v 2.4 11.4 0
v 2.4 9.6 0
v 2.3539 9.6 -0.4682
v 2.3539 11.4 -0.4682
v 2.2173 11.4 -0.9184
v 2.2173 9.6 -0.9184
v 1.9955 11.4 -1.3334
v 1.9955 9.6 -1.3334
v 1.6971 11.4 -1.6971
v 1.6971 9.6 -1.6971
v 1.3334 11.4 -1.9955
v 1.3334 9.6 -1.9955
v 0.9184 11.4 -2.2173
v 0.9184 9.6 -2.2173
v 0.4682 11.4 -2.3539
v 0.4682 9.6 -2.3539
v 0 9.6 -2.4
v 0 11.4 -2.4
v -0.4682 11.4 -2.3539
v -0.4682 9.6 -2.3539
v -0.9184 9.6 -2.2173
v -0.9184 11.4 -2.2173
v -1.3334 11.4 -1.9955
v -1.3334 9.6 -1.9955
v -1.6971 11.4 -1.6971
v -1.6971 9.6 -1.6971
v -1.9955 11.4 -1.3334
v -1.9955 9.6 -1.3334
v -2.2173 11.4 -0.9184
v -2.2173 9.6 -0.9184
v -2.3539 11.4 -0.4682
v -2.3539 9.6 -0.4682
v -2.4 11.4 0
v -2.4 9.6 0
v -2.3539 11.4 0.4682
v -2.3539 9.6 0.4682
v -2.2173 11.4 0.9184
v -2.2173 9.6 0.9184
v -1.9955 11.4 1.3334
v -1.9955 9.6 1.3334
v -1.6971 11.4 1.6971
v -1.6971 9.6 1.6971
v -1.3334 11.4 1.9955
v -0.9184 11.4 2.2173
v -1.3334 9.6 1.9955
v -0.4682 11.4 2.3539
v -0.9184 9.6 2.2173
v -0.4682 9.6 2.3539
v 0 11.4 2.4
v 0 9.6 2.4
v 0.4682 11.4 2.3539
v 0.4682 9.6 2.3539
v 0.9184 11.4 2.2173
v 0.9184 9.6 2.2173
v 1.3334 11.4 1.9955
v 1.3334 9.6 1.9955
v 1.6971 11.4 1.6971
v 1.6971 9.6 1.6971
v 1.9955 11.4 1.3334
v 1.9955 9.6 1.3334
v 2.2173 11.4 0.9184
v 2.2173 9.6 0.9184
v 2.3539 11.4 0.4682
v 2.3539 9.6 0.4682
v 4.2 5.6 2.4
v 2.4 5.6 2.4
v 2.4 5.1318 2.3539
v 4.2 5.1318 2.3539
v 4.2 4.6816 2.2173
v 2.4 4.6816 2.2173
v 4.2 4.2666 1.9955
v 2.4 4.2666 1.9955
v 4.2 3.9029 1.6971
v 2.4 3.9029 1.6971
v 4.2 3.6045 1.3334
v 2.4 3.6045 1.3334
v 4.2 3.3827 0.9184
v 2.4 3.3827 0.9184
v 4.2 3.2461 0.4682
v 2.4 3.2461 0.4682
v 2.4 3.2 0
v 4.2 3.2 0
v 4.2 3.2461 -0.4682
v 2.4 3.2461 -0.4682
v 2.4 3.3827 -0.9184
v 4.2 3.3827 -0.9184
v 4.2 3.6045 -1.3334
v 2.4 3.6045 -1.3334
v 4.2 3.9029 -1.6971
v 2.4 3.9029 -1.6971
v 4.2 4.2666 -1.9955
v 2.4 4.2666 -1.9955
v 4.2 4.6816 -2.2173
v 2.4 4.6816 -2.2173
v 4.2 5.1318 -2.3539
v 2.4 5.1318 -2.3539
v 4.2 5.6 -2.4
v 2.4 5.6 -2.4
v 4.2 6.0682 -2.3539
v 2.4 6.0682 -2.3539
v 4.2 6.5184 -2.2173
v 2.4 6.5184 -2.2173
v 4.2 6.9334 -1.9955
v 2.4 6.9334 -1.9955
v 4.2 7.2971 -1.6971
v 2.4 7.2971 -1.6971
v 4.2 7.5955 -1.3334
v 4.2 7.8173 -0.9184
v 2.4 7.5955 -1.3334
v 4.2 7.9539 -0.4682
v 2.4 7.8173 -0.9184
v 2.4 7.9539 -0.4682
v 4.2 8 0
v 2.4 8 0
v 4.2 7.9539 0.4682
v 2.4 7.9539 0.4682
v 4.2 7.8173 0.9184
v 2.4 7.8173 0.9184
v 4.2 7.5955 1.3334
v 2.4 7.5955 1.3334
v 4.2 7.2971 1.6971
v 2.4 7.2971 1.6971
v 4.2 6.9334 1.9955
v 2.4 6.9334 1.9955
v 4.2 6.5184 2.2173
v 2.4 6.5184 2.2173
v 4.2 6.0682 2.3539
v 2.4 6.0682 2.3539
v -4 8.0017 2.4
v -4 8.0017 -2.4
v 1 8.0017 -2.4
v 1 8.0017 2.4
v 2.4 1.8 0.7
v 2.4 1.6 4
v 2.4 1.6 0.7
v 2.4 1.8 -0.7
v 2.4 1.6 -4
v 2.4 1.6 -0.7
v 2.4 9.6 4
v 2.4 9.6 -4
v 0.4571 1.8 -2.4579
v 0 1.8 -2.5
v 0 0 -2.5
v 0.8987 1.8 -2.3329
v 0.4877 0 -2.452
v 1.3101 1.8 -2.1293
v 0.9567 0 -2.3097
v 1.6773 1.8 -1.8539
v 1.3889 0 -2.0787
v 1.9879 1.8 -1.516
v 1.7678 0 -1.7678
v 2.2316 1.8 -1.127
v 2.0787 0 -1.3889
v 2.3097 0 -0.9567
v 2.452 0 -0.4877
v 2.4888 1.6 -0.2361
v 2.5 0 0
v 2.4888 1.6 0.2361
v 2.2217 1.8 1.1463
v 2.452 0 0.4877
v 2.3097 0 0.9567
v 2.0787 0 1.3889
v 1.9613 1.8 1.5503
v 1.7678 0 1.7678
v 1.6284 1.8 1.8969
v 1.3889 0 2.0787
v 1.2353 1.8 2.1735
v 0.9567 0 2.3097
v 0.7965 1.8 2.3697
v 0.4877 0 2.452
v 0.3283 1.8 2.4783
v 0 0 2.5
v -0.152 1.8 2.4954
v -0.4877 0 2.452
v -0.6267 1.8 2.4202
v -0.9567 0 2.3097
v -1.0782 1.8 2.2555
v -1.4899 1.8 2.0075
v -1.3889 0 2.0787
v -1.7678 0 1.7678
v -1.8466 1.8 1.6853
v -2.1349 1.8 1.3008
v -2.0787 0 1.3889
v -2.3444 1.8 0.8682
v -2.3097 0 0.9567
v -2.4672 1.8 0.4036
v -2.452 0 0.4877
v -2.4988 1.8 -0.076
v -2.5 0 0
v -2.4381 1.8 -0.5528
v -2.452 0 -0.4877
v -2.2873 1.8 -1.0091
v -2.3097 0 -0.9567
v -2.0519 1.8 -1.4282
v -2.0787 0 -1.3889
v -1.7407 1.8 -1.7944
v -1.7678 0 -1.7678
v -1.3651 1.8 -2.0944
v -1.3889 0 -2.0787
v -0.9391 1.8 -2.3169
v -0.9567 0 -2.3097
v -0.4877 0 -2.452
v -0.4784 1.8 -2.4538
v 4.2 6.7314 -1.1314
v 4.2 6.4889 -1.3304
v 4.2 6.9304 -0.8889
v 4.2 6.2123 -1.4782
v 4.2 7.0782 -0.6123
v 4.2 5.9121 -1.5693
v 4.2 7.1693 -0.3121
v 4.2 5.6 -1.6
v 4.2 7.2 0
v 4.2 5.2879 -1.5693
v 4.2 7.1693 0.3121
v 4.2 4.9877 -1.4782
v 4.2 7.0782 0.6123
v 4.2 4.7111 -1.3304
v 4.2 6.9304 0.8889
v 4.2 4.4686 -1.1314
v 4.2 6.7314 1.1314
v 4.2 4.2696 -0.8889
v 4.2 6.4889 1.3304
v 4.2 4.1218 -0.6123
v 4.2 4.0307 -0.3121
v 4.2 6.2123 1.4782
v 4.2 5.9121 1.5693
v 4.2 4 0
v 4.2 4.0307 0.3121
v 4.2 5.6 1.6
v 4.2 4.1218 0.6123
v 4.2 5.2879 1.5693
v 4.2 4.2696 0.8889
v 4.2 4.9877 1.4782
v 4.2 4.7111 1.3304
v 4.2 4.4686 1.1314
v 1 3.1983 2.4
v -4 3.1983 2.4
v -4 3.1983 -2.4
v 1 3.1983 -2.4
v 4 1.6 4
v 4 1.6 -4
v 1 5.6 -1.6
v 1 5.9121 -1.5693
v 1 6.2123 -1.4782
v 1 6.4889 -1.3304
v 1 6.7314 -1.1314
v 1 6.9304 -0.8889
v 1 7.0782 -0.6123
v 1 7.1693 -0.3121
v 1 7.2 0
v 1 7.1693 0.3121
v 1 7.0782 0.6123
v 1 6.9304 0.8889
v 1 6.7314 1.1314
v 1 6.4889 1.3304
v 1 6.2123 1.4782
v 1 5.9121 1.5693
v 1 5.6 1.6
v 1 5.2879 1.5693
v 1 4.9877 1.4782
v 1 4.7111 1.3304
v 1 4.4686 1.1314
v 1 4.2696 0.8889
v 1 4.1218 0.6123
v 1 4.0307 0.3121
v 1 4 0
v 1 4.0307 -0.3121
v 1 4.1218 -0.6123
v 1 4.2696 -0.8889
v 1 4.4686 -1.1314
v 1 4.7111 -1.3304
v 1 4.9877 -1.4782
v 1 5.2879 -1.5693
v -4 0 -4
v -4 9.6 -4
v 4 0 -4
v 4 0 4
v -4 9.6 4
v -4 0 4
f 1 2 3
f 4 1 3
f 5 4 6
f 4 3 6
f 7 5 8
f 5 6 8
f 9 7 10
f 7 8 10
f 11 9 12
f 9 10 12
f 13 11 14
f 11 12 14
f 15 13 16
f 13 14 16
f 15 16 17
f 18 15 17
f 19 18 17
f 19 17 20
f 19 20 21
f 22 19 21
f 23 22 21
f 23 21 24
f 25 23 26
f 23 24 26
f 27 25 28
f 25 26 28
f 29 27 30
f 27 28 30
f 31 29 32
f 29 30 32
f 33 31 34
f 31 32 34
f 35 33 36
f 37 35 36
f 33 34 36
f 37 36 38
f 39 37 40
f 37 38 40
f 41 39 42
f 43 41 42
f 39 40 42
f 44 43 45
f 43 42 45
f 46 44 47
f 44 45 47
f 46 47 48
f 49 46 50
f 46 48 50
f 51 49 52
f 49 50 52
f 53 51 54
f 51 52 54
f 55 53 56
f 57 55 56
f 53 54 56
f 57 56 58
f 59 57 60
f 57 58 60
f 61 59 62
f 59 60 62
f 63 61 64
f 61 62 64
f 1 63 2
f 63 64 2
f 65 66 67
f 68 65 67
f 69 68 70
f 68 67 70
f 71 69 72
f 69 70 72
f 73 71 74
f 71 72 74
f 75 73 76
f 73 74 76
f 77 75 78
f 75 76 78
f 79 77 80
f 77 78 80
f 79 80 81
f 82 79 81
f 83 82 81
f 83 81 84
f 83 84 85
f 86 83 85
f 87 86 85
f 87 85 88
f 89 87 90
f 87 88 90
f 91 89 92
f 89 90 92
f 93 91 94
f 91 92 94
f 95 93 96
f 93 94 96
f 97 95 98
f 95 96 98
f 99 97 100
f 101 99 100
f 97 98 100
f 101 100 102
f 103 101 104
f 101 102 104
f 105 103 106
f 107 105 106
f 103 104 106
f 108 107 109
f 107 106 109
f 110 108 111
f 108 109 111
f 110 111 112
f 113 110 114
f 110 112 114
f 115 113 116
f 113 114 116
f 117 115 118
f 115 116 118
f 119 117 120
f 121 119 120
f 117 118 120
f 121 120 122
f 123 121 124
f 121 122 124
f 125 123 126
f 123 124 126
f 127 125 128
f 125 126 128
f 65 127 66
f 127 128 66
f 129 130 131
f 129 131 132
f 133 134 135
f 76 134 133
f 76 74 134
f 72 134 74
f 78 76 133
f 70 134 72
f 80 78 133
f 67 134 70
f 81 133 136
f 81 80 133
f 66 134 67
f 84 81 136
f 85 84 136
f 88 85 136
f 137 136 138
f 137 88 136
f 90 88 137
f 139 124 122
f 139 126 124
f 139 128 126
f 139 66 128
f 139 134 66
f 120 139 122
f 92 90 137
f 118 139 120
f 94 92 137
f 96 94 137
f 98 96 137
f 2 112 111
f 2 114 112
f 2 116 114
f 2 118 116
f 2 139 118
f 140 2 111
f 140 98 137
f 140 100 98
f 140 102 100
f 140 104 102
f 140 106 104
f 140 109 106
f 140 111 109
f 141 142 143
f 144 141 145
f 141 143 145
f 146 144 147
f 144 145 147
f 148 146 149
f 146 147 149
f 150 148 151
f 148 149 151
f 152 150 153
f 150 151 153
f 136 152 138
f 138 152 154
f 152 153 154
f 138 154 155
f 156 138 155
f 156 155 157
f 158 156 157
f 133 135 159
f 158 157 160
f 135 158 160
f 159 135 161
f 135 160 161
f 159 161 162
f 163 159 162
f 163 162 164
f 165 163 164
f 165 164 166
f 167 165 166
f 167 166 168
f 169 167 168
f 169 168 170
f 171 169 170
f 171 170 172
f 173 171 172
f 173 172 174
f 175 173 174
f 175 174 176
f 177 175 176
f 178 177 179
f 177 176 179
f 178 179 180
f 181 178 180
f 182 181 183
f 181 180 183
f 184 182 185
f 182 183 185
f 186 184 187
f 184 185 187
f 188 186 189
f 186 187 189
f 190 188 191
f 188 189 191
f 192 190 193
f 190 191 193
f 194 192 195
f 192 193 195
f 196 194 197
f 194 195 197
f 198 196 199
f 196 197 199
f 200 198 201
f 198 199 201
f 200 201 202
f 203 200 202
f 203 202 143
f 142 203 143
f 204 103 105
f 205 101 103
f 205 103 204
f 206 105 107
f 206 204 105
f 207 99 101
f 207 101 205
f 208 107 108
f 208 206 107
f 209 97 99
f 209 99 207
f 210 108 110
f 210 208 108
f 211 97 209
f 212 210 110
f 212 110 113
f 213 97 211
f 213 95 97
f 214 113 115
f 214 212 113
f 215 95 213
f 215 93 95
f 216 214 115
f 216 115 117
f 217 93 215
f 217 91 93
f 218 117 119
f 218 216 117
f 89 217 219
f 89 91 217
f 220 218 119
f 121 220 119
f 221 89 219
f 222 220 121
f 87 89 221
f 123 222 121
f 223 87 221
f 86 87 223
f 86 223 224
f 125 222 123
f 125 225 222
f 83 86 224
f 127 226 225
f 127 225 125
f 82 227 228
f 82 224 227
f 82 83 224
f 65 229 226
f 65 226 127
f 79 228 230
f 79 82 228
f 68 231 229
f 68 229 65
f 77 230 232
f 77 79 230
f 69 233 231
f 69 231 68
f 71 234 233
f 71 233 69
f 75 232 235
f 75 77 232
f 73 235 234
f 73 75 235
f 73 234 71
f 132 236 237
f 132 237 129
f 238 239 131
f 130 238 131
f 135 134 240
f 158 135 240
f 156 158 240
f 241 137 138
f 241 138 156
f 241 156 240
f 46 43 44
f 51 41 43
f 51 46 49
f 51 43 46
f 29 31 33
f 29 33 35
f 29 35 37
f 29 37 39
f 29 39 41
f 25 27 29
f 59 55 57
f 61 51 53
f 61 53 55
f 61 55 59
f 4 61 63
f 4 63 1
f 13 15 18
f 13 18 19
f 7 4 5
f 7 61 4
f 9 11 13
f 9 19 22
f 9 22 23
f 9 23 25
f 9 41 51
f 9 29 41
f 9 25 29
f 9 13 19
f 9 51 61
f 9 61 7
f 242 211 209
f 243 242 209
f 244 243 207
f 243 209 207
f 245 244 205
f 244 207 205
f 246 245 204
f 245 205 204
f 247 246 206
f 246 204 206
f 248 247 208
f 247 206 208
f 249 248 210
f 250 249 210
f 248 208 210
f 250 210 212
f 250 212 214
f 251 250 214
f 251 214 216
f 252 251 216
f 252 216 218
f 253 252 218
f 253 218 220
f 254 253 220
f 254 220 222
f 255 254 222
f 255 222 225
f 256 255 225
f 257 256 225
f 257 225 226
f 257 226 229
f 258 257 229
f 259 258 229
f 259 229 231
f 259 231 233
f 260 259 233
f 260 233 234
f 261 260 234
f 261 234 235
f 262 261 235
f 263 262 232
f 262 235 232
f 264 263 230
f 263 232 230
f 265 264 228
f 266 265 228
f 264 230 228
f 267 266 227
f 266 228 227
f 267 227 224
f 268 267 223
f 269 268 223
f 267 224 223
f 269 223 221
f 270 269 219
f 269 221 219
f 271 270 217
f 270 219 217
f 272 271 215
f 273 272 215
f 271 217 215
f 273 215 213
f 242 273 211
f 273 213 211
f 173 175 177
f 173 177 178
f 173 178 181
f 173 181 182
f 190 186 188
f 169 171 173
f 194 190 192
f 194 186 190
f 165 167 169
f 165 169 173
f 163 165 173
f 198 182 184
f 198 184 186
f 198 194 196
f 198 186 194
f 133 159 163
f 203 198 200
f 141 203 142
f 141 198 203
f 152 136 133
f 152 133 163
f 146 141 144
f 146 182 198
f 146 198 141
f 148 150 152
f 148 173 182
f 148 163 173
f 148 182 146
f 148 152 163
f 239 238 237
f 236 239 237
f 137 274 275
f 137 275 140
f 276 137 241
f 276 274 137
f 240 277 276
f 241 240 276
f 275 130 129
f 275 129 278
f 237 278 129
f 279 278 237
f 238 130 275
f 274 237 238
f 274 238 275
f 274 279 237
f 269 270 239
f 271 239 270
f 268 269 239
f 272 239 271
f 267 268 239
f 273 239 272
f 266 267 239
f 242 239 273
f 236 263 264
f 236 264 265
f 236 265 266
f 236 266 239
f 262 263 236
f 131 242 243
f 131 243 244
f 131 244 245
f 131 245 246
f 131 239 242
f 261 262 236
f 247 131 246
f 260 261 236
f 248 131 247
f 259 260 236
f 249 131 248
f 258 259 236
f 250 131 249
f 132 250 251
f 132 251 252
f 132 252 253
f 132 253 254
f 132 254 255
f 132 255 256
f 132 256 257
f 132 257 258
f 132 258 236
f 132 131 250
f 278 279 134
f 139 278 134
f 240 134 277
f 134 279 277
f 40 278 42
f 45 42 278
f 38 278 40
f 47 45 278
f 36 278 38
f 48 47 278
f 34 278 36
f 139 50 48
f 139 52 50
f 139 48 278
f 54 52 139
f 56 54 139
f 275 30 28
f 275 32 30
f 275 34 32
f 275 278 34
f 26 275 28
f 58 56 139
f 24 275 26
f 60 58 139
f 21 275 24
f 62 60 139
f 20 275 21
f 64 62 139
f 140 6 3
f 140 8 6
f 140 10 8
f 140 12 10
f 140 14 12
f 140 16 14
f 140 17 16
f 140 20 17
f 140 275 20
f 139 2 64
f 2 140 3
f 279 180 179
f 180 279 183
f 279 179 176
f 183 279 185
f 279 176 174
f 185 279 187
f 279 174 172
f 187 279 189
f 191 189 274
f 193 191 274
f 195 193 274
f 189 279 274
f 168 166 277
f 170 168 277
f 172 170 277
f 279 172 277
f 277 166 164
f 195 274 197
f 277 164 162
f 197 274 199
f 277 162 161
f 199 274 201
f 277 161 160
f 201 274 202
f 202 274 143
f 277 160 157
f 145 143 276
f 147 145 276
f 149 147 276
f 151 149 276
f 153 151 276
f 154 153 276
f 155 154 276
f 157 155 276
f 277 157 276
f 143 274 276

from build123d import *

# Parameters (mm, degrees)
SKETCH_1_W          = 8
SKETCH_1_H          = 8
EXTRUDE_1_DEPTH     = 9.6
SKETCH_2_W          = 1.6
SKETCH_2_H          = 8
CUT_EXTRUDE_1_DEPTH = 8
SKETCH_5_R          = 2.4
EXTRUDE_2_DEPTH     = 1.8
SKETCH_8_R          = 1.6
CUT_EXTRUDE_3_DEPTH = 9
SKETCH_9_R          = 2.4
EXTRUDE_3_DEPTH     = 1.8
SKETCH_13_W         = 4.8
SKETCH_13_H         = 4.803439306
CUT_EXTRUDE_4_DEPTH = 5
SKETCH_15_R         = 2.5
CUT_EXTRUDE_5_DEPTH = 1.8


with BuildPart() as part:
    # Эскиз1 → Бобышка-Вытянуть1 (new body)
    with BuildSketch(Plane(origin=(0, 0, 0), x_dir=(1, 0, 0), z_dir=(0, 1, 0))):
        Rectangle(SKETCH_1_W, SKETCH_1_H)
    extrude(amount=EXTRUDE_1_DEPTH)

    # Эскиз2 → Вырез-Вытянуть1 (cut)
    with BuildSketch(Plane(origin=(0, 9.6, 0), x_dir=(1, 0, 0), z_dir=(0, 1, 0))):
        with Locations((3.2, 0)):
            Rectangle(SKETCH_2_W, SKETCH_2_H)
    extrude(amount=-CUT_EXTRUDE_1_DEPTH, mode=Mode.SUBTRACT)

    # Эскиз5 → Бобышка-Вытянуть2 (add)
    with BuildSketch(Plane(origin=(2.4, 0, 0), x_dir=(0, 0, -1), z_dir=(1, 0, 0))):
        with Locations(Location((0, 5.6, 0), (0, 0, 180))):
            Circle(SKETCH_5_R)
    extrude(amount=EXTRUDE_2_DEPTH)

    # Эскиз8 → Вырез-Вытянуть3 (cut)
    with BuildSketch(Plane(origin=(4.2, 0, 0), x_dir=(0, 0, -1), z_dir=(1, 0, 0))):
        with Locations((0, 5.6)):
            Circle(SKETCH_8_R)
    extrude(amount=-CUT_EXTRUDE_3_DEPTH, mode=Mode.SUBTRACT)

    # Эскиз9 → Бобышка-Вытянуть3 (add)
    with BuildSketch(Plane(origin=(0, 9.6, 0), x_dir=(1, 0, 0), z_dir=(0, 1, 0))):
        Circle(SKETCH_9_R)
    extrude(amount=EXTRUDE_3_DEPTH)

    # Эскиз13 → Вырез-Вытянуть4 (cut)
    with BuildSketch(Plane.ZY.offset(4)):
        with Locations((0, 5.6)):
            Rectangle(SKETCH_13_W, SKETCH_13_H)
    extrude(amount=-CUT_EXTRUDE_4_DEPTH, mode=Mode.SUBTRACT)

    # Эскиз15 → Вырез-Вытянуть5 (cut)
    with BuildSketch(Plane.XZ):
        with Locations(Location((0, 0, 0), (0, 0, 270))):
            Circle(SKETCH_15_R)
    extrude(amount=-CUT_EXTRUDE_5_DEPTH, mode=Mode.SUBTRACT)


solid = part.part
